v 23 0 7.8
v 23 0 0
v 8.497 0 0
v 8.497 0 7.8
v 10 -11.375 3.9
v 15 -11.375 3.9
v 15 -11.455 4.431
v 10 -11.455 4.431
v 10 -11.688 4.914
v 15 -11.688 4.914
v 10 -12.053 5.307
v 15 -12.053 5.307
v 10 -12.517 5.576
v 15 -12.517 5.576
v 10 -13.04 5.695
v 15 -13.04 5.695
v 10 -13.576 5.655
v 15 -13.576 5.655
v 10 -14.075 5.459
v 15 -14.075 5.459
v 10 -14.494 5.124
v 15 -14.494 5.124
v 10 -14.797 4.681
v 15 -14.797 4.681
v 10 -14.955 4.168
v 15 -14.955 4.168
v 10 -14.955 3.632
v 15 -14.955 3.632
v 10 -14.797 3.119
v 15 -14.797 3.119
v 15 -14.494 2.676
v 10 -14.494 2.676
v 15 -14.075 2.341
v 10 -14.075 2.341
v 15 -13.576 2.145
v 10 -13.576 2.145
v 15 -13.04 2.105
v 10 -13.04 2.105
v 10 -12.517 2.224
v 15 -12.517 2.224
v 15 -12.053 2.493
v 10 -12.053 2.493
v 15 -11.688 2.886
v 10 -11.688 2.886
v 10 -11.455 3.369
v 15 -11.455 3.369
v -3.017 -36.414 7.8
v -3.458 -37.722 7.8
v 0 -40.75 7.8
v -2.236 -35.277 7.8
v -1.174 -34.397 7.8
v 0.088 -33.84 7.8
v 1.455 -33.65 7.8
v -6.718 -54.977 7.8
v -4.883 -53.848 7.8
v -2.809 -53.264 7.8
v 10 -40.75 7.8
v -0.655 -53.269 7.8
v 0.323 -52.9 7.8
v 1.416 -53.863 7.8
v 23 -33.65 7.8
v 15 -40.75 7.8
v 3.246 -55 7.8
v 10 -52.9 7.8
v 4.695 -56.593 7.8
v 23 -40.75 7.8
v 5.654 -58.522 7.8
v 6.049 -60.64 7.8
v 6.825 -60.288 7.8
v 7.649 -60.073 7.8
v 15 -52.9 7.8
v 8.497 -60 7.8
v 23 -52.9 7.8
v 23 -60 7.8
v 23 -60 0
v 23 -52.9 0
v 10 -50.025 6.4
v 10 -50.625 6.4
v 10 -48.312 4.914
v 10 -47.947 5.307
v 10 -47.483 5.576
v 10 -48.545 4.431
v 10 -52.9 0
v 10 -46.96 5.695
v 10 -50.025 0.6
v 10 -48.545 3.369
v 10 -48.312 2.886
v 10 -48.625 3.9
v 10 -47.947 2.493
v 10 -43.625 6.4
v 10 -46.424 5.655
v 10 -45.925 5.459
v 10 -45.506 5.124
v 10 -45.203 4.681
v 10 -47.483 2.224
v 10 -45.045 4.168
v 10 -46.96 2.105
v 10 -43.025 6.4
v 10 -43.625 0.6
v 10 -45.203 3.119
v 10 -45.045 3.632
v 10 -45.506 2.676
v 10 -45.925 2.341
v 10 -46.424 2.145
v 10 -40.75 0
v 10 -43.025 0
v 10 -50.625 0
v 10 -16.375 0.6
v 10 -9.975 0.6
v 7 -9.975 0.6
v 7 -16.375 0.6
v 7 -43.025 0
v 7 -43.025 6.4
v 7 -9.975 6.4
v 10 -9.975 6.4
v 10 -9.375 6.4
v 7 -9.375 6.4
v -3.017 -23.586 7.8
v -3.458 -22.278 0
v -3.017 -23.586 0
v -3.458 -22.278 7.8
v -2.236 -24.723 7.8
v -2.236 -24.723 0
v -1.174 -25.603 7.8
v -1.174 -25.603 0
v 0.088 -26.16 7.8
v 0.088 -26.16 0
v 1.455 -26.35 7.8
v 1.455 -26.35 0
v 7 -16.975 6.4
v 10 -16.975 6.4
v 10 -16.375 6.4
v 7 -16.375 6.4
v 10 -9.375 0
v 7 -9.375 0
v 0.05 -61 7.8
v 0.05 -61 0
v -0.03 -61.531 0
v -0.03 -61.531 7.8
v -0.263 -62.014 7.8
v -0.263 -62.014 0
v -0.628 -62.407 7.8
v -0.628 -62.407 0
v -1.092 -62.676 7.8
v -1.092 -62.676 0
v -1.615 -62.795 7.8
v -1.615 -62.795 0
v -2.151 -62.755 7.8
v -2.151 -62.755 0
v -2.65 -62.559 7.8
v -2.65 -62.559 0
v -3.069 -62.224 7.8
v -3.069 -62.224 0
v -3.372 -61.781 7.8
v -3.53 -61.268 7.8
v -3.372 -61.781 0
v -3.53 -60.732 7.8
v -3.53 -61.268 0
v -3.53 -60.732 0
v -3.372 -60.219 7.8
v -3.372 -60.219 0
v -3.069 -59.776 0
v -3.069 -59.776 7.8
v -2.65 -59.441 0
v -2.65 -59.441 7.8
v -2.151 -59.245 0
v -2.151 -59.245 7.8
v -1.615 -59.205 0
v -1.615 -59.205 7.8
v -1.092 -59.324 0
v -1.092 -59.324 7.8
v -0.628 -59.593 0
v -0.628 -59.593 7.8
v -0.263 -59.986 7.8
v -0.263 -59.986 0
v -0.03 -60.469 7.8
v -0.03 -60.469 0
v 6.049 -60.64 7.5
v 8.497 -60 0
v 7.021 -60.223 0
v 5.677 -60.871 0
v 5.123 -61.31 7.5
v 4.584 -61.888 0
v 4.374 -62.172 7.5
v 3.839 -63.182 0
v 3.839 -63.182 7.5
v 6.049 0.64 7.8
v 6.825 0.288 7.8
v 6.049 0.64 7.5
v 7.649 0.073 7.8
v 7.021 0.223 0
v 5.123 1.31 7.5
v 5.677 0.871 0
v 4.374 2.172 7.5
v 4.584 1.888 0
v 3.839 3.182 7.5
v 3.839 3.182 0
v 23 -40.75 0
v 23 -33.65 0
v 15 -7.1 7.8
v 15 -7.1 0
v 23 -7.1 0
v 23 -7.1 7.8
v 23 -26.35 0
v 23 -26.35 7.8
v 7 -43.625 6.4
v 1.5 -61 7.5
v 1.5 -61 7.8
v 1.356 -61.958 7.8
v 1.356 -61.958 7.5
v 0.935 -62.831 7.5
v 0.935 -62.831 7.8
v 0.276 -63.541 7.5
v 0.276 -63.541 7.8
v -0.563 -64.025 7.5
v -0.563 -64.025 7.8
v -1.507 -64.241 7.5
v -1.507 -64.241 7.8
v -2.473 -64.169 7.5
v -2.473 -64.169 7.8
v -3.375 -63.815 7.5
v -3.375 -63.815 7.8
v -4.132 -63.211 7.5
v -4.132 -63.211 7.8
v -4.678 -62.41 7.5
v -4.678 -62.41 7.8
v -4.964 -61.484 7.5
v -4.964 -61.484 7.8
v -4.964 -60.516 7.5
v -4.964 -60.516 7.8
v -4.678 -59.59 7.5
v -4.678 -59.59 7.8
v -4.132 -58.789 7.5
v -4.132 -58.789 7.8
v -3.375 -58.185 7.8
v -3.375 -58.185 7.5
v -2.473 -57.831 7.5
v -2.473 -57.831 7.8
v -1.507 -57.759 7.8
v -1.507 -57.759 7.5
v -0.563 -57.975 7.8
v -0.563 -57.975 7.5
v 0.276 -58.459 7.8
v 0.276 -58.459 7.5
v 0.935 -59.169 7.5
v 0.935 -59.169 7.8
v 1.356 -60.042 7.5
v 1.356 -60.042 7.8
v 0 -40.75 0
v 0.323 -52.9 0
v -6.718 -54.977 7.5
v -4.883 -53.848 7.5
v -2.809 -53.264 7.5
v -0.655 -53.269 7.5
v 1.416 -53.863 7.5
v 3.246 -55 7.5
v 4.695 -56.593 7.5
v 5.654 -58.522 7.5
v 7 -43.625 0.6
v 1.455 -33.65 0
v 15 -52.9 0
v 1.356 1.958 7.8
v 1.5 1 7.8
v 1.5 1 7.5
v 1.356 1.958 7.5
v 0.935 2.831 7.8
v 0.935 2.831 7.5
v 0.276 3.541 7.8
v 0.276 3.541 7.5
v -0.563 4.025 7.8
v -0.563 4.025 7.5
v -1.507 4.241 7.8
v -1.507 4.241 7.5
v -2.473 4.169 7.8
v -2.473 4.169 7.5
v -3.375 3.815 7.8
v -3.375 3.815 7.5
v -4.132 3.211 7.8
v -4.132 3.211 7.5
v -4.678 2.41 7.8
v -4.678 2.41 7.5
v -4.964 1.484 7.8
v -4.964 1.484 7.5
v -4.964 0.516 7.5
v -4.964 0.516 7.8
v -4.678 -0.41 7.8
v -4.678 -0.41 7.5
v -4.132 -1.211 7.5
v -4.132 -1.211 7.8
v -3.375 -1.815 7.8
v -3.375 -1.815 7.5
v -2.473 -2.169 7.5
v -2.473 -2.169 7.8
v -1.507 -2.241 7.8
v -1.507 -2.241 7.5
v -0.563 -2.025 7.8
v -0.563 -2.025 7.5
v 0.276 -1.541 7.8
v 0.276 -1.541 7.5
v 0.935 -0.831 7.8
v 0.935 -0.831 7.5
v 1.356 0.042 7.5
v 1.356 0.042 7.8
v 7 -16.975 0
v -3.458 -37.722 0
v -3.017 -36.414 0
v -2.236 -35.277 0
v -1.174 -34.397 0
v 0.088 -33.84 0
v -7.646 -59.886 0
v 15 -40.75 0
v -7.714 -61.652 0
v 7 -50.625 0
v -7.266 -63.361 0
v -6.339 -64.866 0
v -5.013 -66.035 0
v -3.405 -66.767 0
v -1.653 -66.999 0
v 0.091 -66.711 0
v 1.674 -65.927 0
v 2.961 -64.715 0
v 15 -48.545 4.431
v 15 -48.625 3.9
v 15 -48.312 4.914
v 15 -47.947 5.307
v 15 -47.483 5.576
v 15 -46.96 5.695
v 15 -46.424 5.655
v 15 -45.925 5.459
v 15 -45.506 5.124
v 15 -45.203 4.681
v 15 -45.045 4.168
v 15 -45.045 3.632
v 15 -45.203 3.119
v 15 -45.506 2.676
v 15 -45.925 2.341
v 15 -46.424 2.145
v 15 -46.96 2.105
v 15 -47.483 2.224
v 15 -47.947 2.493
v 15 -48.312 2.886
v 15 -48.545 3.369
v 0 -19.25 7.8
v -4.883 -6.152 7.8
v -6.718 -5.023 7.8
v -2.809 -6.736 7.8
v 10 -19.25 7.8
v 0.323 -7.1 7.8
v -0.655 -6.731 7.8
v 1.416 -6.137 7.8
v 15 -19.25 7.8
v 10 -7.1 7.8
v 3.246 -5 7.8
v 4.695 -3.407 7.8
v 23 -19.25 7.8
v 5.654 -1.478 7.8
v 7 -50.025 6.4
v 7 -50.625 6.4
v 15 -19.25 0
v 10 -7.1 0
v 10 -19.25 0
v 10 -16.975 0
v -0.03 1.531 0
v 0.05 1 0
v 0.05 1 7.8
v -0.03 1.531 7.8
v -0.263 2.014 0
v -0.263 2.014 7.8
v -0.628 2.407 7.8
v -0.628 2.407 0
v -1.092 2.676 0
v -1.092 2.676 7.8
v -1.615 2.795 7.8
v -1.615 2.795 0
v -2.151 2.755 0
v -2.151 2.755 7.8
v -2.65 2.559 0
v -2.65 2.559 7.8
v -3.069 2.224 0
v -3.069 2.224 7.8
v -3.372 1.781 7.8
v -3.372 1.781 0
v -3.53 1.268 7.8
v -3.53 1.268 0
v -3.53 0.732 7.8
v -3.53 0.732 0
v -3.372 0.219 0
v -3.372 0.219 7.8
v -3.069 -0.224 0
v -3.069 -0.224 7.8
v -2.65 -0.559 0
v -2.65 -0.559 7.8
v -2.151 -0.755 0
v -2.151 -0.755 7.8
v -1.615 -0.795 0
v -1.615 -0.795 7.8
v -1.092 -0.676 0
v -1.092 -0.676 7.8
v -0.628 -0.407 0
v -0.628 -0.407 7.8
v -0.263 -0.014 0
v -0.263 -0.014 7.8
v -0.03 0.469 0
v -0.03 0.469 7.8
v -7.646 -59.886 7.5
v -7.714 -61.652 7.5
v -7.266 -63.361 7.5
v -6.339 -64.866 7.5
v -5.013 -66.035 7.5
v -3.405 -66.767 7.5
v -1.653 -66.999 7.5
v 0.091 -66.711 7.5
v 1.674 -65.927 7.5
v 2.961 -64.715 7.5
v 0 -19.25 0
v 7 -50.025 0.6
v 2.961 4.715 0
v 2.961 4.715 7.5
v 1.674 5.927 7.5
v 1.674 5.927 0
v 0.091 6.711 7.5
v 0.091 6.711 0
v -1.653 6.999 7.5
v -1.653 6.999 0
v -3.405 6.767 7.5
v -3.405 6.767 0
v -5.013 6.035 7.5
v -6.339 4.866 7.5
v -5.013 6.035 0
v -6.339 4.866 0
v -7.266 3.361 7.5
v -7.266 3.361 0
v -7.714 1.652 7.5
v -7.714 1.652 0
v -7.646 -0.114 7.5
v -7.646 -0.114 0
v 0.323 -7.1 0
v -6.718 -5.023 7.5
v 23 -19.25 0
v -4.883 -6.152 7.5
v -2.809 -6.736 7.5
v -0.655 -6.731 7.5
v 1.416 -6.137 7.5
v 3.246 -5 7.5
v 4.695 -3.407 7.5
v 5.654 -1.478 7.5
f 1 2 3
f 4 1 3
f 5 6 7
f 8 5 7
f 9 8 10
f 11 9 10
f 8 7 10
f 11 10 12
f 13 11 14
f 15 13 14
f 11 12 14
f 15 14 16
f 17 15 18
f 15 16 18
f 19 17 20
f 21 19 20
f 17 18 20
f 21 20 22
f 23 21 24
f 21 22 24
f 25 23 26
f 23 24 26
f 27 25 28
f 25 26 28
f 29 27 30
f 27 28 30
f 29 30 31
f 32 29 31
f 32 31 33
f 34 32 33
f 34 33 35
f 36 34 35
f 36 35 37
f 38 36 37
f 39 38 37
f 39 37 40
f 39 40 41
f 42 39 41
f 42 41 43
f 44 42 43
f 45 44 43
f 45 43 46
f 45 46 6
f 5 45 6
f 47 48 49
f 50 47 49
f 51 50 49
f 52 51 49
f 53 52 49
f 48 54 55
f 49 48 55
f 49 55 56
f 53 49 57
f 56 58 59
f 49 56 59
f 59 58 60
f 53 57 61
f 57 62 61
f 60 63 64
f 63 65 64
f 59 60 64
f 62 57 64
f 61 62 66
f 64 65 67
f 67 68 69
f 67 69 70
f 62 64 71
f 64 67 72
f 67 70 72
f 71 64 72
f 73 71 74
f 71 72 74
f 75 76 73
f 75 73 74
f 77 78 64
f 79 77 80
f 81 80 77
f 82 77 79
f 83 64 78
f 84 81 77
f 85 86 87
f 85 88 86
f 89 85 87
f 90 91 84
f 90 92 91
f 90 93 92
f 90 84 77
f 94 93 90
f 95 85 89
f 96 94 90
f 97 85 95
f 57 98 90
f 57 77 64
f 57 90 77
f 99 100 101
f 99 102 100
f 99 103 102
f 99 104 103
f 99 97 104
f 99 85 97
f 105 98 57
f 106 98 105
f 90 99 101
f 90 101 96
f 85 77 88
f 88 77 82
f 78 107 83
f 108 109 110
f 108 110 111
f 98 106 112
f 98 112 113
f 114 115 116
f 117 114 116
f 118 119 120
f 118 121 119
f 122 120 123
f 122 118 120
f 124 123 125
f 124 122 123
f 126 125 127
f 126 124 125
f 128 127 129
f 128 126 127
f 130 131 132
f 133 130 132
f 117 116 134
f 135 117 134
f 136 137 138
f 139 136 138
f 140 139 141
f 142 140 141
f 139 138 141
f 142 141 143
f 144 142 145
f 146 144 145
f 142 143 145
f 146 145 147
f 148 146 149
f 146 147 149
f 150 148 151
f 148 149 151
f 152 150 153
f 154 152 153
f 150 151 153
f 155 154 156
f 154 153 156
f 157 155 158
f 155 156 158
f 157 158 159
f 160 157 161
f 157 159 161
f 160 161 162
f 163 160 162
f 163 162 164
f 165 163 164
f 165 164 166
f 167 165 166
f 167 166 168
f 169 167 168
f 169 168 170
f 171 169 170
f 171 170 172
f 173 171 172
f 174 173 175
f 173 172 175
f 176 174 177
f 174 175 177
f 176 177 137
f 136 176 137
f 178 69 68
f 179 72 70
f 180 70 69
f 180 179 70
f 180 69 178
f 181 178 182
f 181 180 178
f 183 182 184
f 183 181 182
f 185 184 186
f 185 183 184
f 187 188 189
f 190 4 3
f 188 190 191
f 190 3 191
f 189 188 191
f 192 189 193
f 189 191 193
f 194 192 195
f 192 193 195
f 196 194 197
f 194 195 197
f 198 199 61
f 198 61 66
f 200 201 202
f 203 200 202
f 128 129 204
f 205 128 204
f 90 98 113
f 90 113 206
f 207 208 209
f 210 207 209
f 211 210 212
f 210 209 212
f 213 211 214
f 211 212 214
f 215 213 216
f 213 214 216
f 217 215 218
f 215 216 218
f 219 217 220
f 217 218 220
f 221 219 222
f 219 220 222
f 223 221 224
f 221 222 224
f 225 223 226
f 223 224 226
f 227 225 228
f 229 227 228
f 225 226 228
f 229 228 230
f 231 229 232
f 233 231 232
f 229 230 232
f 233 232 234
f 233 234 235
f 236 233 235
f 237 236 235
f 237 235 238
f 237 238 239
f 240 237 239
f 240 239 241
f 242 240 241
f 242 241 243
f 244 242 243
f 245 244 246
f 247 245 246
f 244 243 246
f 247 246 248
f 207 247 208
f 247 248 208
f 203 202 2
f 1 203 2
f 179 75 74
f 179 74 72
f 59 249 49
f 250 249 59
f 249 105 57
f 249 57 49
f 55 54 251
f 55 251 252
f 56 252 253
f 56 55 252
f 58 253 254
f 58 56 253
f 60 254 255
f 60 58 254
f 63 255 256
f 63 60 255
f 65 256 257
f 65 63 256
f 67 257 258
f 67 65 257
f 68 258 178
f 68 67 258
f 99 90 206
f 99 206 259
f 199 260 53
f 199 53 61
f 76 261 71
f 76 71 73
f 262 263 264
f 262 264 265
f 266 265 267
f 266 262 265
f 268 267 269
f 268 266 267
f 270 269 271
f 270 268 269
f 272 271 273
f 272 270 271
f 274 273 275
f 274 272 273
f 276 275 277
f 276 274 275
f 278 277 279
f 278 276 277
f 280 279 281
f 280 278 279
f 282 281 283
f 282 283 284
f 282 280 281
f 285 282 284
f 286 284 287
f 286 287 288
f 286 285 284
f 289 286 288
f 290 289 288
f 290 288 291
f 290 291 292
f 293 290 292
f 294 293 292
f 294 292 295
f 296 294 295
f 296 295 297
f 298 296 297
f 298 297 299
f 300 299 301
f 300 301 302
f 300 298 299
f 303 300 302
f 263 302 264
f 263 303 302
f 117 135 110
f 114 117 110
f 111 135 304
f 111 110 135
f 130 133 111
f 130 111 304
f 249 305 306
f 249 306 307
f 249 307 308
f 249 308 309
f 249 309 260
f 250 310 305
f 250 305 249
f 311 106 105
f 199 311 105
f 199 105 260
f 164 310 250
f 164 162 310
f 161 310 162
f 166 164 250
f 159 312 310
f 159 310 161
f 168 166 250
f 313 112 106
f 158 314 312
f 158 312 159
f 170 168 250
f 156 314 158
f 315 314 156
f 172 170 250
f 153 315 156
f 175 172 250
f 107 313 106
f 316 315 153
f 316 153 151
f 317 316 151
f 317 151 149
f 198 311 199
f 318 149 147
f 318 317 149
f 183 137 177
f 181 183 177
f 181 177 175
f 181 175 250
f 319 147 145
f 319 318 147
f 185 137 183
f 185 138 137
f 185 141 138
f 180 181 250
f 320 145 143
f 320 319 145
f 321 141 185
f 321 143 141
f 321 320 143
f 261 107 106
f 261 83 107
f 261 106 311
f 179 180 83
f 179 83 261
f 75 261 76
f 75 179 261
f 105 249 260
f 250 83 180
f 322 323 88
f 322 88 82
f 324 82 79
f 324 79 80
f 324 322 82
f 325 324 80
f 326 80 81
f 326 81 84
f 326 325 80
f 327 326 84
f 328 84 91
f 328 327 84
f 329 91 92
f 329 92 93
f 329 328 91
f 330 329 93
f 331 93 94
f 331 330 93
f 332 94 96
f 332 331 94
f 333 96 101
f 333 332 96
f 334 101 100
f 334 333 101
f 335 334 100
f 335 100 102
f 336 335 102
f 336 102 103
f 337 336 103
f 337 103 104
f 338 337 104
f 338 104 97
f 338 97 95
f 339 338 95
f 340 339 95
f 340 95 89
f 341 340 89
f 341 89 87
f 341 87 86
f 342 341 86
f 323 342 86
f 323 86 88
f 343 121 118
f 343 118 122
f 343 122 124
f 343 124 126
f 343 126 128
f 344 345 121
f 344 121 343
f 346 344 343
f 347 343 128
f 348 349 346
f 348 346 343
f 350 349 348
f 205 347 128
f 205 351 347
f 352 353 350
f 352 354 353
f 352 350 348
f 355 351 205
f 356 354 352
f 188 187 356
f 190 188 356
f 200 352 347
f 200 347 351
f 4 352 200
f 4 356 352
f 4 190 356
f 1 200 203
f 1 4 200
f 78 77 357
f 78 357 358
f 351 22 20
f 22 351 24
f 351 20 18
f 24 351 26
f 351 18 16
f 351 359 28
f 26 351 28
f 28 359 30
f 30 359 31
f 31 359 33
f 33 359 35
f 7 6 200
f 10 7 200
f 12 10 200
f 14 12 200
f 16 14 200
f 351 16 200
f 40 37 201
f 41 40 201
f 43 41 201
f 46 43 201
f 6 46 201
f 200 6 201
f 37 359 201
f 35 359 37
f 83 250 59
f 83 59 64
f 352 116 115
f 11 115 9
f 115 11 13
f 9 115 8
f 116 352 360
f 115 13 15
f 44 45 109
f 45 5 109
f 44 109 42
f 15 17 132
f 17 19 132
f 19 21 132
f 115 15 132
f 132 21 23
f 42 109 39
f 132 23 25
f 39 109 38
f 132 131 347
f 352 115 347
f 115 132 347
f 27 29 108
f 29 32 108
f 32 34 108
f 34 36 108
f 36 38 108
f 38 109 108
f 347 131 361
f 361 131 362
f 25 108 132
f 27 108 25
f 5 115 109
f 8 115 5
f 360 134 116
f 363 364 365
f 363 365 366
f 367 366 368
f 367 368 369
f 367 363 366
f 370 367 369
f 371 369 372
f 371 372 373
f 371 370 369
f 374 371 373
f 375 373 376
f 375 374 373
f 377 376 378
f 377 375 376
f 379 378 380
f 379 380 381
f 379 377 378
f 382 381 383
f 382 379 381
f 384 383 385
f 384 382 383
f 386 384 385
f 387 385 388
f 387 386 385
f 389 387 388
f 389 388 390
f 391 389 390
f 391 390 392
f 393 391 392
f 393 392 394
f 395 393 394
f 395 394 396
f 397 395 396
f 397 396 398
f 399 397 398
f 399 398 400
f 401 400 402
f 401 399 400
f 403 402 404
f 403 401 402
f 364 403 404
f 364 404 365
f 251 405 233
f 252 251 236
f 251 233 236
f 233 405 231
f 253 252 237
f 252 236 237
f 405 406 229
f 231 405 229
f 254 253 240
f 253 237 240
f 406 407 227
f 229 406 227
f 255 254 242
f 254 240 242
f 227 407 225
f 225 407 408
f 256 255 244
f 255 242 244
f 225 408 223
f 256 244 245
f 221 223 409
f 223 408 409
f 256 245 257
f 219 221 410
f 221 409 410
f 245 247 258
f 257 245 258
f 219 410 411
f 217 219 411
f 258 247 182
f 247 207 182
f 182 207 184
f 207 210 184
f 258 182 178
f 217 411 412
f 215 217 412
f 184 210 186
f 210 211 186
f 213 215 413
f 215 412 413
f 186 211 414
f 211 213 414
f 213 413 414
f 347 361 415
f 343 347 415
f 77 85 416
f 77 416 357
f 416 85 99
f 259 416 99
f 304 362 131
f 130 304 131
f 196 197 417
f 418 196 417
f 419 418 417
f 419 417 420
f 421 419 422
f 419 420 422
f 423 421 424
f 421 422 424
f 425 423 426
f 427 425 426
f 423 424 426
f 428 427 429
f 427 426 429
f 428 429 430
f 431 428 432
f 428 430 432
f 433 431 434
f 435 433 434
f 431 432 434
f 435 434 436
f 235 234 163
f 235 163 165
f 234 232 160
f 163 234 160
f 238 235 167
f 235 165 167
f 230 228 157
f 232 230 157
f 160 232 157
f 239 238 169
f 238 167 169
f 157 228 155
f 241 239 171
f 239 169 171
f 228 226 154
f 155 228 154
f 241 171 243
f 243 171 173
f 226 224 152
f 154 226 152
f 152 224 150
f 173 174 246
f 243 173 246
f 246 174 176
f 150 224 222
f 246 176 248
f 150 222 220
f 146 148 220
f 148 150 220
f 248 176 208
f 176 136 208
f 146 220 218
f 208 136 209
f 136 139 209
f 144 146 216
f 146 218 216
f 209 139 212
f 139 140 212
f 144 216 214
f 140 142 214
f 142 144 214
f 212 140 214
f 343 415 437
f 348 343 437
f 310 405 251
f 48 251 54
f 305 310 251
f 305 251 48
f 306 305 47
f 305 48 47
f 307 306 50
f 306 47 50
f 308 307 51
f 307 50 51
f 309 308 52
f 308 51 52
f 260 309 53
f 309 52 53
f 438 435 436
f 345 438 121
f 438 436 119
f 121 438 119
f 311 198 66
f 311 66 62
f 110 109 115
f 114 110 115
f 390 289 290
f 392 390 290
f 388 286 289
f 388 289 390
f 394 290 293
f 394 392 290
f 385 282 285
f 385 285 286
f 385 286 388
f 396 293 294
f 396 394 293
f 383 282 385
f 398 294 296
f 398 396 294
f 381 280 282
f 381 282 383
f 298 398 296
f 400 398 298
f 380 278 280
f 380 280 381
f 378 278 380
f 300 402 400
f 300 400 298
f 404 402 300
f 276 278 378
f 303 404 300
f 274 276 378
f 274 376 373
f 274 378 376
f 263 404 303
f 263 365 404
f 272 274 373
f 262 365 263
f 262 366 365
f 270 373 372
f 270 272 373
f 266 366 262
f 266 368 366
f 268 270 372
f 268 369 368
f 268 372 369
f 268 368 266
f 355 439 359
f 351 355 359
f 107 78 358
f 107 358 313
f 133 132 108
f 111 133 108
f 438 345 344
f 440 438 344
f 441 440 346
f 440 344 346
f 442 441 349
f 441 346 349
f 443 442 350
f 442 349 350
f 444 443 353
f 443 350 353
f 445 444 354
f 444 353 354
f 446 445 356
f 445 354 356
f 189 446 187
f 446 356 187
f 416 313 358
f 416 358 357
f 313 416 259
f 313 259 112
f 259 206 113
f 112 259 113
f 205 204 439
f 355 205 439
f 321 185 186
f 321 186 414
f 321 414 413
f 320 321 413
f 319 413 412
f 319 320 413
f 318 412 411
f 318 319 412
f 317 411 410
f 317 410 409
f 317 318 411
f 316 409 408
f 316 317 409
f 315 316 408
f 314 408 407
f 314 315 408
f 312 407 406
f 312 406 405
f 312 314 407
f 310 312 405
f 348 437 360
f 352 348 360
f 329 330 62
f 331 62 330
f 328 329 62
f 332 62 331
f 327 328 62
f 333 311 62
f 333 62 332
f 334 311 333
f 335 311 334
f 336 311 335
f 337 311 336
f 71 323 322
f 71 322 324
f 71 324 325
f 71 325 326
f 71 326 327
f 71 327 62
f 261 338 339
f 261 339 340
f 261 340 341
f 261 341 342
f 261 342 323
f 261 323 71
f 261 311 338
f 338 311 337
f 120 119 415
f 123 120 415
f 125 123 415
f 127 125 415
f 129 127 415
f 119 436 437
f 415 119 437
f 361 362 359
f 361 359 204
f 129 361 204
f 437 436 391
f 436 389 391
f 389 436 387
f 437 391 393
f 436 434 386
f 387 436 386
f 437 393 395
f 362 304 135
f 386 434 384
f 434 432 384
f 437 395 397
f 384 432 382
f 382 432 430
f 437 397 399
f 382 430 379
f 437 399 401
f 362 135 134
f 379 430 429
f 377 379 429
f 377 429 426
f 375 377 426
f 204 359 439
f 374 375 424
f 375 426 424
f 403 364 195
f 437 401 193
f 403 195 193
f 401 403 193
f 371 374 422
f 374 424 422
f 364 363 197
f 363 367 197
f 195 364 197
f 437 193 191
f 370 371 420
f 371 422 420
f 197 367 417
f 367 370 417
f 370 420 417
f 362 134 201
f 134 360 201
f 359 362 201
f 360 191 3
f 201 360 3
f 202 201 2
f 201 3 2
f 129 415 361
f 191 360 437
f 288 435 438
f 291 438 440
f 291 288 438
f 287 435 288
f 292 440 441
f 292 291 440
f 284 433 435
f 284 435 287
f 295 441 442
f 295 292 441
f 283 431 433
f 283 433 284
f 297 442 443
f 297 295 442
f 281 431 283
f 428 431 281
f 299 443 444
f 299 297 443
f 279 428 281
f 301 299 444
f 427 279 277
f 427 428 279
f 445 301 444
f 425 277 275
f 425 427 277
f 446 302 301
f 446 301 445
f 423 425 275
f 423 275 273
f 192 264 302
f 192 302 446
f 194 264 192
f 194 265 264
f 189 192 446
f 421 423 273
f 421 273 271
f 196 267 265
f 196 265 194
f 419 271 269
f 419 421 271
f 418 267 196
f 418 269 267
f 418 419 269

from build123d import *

# Parameters (mm, degrees)
F0_R      = 1.8
F1_DEPTH  = 7.8
F2_R      = 5
F3_R      = 1.8
F4_DEPTH  = 6
F5_W      = 6.4
F5_H      = 0.6
F6_DEPTH  = 3
F9_R      = 3.25
F10_DEPTH = 0.3


with BuildPart() as f1:
    # F0 (on Top) → F1 (new body)
    with BuildSketch(Plane.XY):
        with BuildLine():
            Line((23, 0), (8.496951, 0))
            ThreePointArc((8.496951, 0), (5.67657, 0.871386), (3.839246, 3.181818))
            ThreePointArc((3.839246, 3.181818), (-3.404953, 6.767246), (-7.645701, -0.11387))
            Line((-7.645701, -0.11387), (-2.688929, -26.35))
            Line((-2.688929, -26.35), (-0.188929, -26.35))
            Line((-0.188929, -26.35), (23, -26.35))
            Line((23, -26.35), (23, -19.25))
            Line((23, -19.25), (15, -19.25))
            Line((15, -19.25), (15, -7.1))
            Line((15, -7.1), (23, -7.1))
            Line((23, -7.1), (23, 0))
        make_face()
        Polygon((0, -19.25), (0.323308, -7.1), (10, -7.1), (10, -19.25), align=None, mode=Mode.SUBTRACT)
        with Locations((-1.75, 1)):
            Circle(F0_R, mode=Mode.SUBTRACT)
    extrude(amount=F1_DEPTH)

    # F2
    f2_edges = [f1.edges().sort_by_distance(p)[0] for p in [
        (-2.688929, -26.35, 3.9),
    ]]
    fillet(f2_edges, radius=F2_R)

    # F3 (on face) → F4 (cut)
    with BuildSketch(Plane.YZ.offset(15)):
        with Locations((-13.175, 3.9)):
            Circle(F3_R)
    extrude(amount=-F4_DEPTH, mode=Mode.SUBTRACT)

    # F5 (on face) → F6 (join)
    with BuildSketch(Plane(origin=(10, 0, 0), x_dir=(0, -1, 0), z_dir=(-1, 0, 0))):
        Polygon((9.375, 0), (9.975, 0), (9.975, 0.6), (9.975, 6.4), (9.375, 6.4), align=None)
        Polygon((16.375, 0.6), (16.375, 0), (16.975, 0), (16.975, 6.4), (16.375, 6.4), align=None)
        with Locations((13.175, 0.3)):
            Rectangle(F5_W, F5_H)
    extrude(amount=F6_DEPTH)

    # F9 (on face) → F10 (cut)
    with BuildSketch(Plane.XY.offset(7.8)):
        with BuildLine():
            Line((-7.645701, -0.11387), (-6.718189, -5.023179))
            ThreePointArc((-6.718189, -5.023179), (1.415732, -6.137208), (6.049485, 0.639964))
            ThreePointArc((6.049485, 0.639964), (4.723873, 1.719164), (3.839246, 3.181818))
            ThreePointArc((3.839246, 3.181818), (-3.404953, 6.767246), (-7.645701, -0.11387))
        make_face()
        with Locations((-1.75, 1)):
            Circle(F9_R, mode=Mode.SUBTRACT)
    extrude(amount=-F10_DEPTH, mode=Mode.SUBTRACT)


with BuildPart() as f8_1:
    # F8: instance of F1
    add(f1.part.mirror(Plane.XZ.offset(30)))


with BuildPart() as f12_1:
    # F12: instance of F1
    add(f1.part.mirror(Plane.XZ.offset(30)))


solid = Compound([f1.part, f12_1.part])
